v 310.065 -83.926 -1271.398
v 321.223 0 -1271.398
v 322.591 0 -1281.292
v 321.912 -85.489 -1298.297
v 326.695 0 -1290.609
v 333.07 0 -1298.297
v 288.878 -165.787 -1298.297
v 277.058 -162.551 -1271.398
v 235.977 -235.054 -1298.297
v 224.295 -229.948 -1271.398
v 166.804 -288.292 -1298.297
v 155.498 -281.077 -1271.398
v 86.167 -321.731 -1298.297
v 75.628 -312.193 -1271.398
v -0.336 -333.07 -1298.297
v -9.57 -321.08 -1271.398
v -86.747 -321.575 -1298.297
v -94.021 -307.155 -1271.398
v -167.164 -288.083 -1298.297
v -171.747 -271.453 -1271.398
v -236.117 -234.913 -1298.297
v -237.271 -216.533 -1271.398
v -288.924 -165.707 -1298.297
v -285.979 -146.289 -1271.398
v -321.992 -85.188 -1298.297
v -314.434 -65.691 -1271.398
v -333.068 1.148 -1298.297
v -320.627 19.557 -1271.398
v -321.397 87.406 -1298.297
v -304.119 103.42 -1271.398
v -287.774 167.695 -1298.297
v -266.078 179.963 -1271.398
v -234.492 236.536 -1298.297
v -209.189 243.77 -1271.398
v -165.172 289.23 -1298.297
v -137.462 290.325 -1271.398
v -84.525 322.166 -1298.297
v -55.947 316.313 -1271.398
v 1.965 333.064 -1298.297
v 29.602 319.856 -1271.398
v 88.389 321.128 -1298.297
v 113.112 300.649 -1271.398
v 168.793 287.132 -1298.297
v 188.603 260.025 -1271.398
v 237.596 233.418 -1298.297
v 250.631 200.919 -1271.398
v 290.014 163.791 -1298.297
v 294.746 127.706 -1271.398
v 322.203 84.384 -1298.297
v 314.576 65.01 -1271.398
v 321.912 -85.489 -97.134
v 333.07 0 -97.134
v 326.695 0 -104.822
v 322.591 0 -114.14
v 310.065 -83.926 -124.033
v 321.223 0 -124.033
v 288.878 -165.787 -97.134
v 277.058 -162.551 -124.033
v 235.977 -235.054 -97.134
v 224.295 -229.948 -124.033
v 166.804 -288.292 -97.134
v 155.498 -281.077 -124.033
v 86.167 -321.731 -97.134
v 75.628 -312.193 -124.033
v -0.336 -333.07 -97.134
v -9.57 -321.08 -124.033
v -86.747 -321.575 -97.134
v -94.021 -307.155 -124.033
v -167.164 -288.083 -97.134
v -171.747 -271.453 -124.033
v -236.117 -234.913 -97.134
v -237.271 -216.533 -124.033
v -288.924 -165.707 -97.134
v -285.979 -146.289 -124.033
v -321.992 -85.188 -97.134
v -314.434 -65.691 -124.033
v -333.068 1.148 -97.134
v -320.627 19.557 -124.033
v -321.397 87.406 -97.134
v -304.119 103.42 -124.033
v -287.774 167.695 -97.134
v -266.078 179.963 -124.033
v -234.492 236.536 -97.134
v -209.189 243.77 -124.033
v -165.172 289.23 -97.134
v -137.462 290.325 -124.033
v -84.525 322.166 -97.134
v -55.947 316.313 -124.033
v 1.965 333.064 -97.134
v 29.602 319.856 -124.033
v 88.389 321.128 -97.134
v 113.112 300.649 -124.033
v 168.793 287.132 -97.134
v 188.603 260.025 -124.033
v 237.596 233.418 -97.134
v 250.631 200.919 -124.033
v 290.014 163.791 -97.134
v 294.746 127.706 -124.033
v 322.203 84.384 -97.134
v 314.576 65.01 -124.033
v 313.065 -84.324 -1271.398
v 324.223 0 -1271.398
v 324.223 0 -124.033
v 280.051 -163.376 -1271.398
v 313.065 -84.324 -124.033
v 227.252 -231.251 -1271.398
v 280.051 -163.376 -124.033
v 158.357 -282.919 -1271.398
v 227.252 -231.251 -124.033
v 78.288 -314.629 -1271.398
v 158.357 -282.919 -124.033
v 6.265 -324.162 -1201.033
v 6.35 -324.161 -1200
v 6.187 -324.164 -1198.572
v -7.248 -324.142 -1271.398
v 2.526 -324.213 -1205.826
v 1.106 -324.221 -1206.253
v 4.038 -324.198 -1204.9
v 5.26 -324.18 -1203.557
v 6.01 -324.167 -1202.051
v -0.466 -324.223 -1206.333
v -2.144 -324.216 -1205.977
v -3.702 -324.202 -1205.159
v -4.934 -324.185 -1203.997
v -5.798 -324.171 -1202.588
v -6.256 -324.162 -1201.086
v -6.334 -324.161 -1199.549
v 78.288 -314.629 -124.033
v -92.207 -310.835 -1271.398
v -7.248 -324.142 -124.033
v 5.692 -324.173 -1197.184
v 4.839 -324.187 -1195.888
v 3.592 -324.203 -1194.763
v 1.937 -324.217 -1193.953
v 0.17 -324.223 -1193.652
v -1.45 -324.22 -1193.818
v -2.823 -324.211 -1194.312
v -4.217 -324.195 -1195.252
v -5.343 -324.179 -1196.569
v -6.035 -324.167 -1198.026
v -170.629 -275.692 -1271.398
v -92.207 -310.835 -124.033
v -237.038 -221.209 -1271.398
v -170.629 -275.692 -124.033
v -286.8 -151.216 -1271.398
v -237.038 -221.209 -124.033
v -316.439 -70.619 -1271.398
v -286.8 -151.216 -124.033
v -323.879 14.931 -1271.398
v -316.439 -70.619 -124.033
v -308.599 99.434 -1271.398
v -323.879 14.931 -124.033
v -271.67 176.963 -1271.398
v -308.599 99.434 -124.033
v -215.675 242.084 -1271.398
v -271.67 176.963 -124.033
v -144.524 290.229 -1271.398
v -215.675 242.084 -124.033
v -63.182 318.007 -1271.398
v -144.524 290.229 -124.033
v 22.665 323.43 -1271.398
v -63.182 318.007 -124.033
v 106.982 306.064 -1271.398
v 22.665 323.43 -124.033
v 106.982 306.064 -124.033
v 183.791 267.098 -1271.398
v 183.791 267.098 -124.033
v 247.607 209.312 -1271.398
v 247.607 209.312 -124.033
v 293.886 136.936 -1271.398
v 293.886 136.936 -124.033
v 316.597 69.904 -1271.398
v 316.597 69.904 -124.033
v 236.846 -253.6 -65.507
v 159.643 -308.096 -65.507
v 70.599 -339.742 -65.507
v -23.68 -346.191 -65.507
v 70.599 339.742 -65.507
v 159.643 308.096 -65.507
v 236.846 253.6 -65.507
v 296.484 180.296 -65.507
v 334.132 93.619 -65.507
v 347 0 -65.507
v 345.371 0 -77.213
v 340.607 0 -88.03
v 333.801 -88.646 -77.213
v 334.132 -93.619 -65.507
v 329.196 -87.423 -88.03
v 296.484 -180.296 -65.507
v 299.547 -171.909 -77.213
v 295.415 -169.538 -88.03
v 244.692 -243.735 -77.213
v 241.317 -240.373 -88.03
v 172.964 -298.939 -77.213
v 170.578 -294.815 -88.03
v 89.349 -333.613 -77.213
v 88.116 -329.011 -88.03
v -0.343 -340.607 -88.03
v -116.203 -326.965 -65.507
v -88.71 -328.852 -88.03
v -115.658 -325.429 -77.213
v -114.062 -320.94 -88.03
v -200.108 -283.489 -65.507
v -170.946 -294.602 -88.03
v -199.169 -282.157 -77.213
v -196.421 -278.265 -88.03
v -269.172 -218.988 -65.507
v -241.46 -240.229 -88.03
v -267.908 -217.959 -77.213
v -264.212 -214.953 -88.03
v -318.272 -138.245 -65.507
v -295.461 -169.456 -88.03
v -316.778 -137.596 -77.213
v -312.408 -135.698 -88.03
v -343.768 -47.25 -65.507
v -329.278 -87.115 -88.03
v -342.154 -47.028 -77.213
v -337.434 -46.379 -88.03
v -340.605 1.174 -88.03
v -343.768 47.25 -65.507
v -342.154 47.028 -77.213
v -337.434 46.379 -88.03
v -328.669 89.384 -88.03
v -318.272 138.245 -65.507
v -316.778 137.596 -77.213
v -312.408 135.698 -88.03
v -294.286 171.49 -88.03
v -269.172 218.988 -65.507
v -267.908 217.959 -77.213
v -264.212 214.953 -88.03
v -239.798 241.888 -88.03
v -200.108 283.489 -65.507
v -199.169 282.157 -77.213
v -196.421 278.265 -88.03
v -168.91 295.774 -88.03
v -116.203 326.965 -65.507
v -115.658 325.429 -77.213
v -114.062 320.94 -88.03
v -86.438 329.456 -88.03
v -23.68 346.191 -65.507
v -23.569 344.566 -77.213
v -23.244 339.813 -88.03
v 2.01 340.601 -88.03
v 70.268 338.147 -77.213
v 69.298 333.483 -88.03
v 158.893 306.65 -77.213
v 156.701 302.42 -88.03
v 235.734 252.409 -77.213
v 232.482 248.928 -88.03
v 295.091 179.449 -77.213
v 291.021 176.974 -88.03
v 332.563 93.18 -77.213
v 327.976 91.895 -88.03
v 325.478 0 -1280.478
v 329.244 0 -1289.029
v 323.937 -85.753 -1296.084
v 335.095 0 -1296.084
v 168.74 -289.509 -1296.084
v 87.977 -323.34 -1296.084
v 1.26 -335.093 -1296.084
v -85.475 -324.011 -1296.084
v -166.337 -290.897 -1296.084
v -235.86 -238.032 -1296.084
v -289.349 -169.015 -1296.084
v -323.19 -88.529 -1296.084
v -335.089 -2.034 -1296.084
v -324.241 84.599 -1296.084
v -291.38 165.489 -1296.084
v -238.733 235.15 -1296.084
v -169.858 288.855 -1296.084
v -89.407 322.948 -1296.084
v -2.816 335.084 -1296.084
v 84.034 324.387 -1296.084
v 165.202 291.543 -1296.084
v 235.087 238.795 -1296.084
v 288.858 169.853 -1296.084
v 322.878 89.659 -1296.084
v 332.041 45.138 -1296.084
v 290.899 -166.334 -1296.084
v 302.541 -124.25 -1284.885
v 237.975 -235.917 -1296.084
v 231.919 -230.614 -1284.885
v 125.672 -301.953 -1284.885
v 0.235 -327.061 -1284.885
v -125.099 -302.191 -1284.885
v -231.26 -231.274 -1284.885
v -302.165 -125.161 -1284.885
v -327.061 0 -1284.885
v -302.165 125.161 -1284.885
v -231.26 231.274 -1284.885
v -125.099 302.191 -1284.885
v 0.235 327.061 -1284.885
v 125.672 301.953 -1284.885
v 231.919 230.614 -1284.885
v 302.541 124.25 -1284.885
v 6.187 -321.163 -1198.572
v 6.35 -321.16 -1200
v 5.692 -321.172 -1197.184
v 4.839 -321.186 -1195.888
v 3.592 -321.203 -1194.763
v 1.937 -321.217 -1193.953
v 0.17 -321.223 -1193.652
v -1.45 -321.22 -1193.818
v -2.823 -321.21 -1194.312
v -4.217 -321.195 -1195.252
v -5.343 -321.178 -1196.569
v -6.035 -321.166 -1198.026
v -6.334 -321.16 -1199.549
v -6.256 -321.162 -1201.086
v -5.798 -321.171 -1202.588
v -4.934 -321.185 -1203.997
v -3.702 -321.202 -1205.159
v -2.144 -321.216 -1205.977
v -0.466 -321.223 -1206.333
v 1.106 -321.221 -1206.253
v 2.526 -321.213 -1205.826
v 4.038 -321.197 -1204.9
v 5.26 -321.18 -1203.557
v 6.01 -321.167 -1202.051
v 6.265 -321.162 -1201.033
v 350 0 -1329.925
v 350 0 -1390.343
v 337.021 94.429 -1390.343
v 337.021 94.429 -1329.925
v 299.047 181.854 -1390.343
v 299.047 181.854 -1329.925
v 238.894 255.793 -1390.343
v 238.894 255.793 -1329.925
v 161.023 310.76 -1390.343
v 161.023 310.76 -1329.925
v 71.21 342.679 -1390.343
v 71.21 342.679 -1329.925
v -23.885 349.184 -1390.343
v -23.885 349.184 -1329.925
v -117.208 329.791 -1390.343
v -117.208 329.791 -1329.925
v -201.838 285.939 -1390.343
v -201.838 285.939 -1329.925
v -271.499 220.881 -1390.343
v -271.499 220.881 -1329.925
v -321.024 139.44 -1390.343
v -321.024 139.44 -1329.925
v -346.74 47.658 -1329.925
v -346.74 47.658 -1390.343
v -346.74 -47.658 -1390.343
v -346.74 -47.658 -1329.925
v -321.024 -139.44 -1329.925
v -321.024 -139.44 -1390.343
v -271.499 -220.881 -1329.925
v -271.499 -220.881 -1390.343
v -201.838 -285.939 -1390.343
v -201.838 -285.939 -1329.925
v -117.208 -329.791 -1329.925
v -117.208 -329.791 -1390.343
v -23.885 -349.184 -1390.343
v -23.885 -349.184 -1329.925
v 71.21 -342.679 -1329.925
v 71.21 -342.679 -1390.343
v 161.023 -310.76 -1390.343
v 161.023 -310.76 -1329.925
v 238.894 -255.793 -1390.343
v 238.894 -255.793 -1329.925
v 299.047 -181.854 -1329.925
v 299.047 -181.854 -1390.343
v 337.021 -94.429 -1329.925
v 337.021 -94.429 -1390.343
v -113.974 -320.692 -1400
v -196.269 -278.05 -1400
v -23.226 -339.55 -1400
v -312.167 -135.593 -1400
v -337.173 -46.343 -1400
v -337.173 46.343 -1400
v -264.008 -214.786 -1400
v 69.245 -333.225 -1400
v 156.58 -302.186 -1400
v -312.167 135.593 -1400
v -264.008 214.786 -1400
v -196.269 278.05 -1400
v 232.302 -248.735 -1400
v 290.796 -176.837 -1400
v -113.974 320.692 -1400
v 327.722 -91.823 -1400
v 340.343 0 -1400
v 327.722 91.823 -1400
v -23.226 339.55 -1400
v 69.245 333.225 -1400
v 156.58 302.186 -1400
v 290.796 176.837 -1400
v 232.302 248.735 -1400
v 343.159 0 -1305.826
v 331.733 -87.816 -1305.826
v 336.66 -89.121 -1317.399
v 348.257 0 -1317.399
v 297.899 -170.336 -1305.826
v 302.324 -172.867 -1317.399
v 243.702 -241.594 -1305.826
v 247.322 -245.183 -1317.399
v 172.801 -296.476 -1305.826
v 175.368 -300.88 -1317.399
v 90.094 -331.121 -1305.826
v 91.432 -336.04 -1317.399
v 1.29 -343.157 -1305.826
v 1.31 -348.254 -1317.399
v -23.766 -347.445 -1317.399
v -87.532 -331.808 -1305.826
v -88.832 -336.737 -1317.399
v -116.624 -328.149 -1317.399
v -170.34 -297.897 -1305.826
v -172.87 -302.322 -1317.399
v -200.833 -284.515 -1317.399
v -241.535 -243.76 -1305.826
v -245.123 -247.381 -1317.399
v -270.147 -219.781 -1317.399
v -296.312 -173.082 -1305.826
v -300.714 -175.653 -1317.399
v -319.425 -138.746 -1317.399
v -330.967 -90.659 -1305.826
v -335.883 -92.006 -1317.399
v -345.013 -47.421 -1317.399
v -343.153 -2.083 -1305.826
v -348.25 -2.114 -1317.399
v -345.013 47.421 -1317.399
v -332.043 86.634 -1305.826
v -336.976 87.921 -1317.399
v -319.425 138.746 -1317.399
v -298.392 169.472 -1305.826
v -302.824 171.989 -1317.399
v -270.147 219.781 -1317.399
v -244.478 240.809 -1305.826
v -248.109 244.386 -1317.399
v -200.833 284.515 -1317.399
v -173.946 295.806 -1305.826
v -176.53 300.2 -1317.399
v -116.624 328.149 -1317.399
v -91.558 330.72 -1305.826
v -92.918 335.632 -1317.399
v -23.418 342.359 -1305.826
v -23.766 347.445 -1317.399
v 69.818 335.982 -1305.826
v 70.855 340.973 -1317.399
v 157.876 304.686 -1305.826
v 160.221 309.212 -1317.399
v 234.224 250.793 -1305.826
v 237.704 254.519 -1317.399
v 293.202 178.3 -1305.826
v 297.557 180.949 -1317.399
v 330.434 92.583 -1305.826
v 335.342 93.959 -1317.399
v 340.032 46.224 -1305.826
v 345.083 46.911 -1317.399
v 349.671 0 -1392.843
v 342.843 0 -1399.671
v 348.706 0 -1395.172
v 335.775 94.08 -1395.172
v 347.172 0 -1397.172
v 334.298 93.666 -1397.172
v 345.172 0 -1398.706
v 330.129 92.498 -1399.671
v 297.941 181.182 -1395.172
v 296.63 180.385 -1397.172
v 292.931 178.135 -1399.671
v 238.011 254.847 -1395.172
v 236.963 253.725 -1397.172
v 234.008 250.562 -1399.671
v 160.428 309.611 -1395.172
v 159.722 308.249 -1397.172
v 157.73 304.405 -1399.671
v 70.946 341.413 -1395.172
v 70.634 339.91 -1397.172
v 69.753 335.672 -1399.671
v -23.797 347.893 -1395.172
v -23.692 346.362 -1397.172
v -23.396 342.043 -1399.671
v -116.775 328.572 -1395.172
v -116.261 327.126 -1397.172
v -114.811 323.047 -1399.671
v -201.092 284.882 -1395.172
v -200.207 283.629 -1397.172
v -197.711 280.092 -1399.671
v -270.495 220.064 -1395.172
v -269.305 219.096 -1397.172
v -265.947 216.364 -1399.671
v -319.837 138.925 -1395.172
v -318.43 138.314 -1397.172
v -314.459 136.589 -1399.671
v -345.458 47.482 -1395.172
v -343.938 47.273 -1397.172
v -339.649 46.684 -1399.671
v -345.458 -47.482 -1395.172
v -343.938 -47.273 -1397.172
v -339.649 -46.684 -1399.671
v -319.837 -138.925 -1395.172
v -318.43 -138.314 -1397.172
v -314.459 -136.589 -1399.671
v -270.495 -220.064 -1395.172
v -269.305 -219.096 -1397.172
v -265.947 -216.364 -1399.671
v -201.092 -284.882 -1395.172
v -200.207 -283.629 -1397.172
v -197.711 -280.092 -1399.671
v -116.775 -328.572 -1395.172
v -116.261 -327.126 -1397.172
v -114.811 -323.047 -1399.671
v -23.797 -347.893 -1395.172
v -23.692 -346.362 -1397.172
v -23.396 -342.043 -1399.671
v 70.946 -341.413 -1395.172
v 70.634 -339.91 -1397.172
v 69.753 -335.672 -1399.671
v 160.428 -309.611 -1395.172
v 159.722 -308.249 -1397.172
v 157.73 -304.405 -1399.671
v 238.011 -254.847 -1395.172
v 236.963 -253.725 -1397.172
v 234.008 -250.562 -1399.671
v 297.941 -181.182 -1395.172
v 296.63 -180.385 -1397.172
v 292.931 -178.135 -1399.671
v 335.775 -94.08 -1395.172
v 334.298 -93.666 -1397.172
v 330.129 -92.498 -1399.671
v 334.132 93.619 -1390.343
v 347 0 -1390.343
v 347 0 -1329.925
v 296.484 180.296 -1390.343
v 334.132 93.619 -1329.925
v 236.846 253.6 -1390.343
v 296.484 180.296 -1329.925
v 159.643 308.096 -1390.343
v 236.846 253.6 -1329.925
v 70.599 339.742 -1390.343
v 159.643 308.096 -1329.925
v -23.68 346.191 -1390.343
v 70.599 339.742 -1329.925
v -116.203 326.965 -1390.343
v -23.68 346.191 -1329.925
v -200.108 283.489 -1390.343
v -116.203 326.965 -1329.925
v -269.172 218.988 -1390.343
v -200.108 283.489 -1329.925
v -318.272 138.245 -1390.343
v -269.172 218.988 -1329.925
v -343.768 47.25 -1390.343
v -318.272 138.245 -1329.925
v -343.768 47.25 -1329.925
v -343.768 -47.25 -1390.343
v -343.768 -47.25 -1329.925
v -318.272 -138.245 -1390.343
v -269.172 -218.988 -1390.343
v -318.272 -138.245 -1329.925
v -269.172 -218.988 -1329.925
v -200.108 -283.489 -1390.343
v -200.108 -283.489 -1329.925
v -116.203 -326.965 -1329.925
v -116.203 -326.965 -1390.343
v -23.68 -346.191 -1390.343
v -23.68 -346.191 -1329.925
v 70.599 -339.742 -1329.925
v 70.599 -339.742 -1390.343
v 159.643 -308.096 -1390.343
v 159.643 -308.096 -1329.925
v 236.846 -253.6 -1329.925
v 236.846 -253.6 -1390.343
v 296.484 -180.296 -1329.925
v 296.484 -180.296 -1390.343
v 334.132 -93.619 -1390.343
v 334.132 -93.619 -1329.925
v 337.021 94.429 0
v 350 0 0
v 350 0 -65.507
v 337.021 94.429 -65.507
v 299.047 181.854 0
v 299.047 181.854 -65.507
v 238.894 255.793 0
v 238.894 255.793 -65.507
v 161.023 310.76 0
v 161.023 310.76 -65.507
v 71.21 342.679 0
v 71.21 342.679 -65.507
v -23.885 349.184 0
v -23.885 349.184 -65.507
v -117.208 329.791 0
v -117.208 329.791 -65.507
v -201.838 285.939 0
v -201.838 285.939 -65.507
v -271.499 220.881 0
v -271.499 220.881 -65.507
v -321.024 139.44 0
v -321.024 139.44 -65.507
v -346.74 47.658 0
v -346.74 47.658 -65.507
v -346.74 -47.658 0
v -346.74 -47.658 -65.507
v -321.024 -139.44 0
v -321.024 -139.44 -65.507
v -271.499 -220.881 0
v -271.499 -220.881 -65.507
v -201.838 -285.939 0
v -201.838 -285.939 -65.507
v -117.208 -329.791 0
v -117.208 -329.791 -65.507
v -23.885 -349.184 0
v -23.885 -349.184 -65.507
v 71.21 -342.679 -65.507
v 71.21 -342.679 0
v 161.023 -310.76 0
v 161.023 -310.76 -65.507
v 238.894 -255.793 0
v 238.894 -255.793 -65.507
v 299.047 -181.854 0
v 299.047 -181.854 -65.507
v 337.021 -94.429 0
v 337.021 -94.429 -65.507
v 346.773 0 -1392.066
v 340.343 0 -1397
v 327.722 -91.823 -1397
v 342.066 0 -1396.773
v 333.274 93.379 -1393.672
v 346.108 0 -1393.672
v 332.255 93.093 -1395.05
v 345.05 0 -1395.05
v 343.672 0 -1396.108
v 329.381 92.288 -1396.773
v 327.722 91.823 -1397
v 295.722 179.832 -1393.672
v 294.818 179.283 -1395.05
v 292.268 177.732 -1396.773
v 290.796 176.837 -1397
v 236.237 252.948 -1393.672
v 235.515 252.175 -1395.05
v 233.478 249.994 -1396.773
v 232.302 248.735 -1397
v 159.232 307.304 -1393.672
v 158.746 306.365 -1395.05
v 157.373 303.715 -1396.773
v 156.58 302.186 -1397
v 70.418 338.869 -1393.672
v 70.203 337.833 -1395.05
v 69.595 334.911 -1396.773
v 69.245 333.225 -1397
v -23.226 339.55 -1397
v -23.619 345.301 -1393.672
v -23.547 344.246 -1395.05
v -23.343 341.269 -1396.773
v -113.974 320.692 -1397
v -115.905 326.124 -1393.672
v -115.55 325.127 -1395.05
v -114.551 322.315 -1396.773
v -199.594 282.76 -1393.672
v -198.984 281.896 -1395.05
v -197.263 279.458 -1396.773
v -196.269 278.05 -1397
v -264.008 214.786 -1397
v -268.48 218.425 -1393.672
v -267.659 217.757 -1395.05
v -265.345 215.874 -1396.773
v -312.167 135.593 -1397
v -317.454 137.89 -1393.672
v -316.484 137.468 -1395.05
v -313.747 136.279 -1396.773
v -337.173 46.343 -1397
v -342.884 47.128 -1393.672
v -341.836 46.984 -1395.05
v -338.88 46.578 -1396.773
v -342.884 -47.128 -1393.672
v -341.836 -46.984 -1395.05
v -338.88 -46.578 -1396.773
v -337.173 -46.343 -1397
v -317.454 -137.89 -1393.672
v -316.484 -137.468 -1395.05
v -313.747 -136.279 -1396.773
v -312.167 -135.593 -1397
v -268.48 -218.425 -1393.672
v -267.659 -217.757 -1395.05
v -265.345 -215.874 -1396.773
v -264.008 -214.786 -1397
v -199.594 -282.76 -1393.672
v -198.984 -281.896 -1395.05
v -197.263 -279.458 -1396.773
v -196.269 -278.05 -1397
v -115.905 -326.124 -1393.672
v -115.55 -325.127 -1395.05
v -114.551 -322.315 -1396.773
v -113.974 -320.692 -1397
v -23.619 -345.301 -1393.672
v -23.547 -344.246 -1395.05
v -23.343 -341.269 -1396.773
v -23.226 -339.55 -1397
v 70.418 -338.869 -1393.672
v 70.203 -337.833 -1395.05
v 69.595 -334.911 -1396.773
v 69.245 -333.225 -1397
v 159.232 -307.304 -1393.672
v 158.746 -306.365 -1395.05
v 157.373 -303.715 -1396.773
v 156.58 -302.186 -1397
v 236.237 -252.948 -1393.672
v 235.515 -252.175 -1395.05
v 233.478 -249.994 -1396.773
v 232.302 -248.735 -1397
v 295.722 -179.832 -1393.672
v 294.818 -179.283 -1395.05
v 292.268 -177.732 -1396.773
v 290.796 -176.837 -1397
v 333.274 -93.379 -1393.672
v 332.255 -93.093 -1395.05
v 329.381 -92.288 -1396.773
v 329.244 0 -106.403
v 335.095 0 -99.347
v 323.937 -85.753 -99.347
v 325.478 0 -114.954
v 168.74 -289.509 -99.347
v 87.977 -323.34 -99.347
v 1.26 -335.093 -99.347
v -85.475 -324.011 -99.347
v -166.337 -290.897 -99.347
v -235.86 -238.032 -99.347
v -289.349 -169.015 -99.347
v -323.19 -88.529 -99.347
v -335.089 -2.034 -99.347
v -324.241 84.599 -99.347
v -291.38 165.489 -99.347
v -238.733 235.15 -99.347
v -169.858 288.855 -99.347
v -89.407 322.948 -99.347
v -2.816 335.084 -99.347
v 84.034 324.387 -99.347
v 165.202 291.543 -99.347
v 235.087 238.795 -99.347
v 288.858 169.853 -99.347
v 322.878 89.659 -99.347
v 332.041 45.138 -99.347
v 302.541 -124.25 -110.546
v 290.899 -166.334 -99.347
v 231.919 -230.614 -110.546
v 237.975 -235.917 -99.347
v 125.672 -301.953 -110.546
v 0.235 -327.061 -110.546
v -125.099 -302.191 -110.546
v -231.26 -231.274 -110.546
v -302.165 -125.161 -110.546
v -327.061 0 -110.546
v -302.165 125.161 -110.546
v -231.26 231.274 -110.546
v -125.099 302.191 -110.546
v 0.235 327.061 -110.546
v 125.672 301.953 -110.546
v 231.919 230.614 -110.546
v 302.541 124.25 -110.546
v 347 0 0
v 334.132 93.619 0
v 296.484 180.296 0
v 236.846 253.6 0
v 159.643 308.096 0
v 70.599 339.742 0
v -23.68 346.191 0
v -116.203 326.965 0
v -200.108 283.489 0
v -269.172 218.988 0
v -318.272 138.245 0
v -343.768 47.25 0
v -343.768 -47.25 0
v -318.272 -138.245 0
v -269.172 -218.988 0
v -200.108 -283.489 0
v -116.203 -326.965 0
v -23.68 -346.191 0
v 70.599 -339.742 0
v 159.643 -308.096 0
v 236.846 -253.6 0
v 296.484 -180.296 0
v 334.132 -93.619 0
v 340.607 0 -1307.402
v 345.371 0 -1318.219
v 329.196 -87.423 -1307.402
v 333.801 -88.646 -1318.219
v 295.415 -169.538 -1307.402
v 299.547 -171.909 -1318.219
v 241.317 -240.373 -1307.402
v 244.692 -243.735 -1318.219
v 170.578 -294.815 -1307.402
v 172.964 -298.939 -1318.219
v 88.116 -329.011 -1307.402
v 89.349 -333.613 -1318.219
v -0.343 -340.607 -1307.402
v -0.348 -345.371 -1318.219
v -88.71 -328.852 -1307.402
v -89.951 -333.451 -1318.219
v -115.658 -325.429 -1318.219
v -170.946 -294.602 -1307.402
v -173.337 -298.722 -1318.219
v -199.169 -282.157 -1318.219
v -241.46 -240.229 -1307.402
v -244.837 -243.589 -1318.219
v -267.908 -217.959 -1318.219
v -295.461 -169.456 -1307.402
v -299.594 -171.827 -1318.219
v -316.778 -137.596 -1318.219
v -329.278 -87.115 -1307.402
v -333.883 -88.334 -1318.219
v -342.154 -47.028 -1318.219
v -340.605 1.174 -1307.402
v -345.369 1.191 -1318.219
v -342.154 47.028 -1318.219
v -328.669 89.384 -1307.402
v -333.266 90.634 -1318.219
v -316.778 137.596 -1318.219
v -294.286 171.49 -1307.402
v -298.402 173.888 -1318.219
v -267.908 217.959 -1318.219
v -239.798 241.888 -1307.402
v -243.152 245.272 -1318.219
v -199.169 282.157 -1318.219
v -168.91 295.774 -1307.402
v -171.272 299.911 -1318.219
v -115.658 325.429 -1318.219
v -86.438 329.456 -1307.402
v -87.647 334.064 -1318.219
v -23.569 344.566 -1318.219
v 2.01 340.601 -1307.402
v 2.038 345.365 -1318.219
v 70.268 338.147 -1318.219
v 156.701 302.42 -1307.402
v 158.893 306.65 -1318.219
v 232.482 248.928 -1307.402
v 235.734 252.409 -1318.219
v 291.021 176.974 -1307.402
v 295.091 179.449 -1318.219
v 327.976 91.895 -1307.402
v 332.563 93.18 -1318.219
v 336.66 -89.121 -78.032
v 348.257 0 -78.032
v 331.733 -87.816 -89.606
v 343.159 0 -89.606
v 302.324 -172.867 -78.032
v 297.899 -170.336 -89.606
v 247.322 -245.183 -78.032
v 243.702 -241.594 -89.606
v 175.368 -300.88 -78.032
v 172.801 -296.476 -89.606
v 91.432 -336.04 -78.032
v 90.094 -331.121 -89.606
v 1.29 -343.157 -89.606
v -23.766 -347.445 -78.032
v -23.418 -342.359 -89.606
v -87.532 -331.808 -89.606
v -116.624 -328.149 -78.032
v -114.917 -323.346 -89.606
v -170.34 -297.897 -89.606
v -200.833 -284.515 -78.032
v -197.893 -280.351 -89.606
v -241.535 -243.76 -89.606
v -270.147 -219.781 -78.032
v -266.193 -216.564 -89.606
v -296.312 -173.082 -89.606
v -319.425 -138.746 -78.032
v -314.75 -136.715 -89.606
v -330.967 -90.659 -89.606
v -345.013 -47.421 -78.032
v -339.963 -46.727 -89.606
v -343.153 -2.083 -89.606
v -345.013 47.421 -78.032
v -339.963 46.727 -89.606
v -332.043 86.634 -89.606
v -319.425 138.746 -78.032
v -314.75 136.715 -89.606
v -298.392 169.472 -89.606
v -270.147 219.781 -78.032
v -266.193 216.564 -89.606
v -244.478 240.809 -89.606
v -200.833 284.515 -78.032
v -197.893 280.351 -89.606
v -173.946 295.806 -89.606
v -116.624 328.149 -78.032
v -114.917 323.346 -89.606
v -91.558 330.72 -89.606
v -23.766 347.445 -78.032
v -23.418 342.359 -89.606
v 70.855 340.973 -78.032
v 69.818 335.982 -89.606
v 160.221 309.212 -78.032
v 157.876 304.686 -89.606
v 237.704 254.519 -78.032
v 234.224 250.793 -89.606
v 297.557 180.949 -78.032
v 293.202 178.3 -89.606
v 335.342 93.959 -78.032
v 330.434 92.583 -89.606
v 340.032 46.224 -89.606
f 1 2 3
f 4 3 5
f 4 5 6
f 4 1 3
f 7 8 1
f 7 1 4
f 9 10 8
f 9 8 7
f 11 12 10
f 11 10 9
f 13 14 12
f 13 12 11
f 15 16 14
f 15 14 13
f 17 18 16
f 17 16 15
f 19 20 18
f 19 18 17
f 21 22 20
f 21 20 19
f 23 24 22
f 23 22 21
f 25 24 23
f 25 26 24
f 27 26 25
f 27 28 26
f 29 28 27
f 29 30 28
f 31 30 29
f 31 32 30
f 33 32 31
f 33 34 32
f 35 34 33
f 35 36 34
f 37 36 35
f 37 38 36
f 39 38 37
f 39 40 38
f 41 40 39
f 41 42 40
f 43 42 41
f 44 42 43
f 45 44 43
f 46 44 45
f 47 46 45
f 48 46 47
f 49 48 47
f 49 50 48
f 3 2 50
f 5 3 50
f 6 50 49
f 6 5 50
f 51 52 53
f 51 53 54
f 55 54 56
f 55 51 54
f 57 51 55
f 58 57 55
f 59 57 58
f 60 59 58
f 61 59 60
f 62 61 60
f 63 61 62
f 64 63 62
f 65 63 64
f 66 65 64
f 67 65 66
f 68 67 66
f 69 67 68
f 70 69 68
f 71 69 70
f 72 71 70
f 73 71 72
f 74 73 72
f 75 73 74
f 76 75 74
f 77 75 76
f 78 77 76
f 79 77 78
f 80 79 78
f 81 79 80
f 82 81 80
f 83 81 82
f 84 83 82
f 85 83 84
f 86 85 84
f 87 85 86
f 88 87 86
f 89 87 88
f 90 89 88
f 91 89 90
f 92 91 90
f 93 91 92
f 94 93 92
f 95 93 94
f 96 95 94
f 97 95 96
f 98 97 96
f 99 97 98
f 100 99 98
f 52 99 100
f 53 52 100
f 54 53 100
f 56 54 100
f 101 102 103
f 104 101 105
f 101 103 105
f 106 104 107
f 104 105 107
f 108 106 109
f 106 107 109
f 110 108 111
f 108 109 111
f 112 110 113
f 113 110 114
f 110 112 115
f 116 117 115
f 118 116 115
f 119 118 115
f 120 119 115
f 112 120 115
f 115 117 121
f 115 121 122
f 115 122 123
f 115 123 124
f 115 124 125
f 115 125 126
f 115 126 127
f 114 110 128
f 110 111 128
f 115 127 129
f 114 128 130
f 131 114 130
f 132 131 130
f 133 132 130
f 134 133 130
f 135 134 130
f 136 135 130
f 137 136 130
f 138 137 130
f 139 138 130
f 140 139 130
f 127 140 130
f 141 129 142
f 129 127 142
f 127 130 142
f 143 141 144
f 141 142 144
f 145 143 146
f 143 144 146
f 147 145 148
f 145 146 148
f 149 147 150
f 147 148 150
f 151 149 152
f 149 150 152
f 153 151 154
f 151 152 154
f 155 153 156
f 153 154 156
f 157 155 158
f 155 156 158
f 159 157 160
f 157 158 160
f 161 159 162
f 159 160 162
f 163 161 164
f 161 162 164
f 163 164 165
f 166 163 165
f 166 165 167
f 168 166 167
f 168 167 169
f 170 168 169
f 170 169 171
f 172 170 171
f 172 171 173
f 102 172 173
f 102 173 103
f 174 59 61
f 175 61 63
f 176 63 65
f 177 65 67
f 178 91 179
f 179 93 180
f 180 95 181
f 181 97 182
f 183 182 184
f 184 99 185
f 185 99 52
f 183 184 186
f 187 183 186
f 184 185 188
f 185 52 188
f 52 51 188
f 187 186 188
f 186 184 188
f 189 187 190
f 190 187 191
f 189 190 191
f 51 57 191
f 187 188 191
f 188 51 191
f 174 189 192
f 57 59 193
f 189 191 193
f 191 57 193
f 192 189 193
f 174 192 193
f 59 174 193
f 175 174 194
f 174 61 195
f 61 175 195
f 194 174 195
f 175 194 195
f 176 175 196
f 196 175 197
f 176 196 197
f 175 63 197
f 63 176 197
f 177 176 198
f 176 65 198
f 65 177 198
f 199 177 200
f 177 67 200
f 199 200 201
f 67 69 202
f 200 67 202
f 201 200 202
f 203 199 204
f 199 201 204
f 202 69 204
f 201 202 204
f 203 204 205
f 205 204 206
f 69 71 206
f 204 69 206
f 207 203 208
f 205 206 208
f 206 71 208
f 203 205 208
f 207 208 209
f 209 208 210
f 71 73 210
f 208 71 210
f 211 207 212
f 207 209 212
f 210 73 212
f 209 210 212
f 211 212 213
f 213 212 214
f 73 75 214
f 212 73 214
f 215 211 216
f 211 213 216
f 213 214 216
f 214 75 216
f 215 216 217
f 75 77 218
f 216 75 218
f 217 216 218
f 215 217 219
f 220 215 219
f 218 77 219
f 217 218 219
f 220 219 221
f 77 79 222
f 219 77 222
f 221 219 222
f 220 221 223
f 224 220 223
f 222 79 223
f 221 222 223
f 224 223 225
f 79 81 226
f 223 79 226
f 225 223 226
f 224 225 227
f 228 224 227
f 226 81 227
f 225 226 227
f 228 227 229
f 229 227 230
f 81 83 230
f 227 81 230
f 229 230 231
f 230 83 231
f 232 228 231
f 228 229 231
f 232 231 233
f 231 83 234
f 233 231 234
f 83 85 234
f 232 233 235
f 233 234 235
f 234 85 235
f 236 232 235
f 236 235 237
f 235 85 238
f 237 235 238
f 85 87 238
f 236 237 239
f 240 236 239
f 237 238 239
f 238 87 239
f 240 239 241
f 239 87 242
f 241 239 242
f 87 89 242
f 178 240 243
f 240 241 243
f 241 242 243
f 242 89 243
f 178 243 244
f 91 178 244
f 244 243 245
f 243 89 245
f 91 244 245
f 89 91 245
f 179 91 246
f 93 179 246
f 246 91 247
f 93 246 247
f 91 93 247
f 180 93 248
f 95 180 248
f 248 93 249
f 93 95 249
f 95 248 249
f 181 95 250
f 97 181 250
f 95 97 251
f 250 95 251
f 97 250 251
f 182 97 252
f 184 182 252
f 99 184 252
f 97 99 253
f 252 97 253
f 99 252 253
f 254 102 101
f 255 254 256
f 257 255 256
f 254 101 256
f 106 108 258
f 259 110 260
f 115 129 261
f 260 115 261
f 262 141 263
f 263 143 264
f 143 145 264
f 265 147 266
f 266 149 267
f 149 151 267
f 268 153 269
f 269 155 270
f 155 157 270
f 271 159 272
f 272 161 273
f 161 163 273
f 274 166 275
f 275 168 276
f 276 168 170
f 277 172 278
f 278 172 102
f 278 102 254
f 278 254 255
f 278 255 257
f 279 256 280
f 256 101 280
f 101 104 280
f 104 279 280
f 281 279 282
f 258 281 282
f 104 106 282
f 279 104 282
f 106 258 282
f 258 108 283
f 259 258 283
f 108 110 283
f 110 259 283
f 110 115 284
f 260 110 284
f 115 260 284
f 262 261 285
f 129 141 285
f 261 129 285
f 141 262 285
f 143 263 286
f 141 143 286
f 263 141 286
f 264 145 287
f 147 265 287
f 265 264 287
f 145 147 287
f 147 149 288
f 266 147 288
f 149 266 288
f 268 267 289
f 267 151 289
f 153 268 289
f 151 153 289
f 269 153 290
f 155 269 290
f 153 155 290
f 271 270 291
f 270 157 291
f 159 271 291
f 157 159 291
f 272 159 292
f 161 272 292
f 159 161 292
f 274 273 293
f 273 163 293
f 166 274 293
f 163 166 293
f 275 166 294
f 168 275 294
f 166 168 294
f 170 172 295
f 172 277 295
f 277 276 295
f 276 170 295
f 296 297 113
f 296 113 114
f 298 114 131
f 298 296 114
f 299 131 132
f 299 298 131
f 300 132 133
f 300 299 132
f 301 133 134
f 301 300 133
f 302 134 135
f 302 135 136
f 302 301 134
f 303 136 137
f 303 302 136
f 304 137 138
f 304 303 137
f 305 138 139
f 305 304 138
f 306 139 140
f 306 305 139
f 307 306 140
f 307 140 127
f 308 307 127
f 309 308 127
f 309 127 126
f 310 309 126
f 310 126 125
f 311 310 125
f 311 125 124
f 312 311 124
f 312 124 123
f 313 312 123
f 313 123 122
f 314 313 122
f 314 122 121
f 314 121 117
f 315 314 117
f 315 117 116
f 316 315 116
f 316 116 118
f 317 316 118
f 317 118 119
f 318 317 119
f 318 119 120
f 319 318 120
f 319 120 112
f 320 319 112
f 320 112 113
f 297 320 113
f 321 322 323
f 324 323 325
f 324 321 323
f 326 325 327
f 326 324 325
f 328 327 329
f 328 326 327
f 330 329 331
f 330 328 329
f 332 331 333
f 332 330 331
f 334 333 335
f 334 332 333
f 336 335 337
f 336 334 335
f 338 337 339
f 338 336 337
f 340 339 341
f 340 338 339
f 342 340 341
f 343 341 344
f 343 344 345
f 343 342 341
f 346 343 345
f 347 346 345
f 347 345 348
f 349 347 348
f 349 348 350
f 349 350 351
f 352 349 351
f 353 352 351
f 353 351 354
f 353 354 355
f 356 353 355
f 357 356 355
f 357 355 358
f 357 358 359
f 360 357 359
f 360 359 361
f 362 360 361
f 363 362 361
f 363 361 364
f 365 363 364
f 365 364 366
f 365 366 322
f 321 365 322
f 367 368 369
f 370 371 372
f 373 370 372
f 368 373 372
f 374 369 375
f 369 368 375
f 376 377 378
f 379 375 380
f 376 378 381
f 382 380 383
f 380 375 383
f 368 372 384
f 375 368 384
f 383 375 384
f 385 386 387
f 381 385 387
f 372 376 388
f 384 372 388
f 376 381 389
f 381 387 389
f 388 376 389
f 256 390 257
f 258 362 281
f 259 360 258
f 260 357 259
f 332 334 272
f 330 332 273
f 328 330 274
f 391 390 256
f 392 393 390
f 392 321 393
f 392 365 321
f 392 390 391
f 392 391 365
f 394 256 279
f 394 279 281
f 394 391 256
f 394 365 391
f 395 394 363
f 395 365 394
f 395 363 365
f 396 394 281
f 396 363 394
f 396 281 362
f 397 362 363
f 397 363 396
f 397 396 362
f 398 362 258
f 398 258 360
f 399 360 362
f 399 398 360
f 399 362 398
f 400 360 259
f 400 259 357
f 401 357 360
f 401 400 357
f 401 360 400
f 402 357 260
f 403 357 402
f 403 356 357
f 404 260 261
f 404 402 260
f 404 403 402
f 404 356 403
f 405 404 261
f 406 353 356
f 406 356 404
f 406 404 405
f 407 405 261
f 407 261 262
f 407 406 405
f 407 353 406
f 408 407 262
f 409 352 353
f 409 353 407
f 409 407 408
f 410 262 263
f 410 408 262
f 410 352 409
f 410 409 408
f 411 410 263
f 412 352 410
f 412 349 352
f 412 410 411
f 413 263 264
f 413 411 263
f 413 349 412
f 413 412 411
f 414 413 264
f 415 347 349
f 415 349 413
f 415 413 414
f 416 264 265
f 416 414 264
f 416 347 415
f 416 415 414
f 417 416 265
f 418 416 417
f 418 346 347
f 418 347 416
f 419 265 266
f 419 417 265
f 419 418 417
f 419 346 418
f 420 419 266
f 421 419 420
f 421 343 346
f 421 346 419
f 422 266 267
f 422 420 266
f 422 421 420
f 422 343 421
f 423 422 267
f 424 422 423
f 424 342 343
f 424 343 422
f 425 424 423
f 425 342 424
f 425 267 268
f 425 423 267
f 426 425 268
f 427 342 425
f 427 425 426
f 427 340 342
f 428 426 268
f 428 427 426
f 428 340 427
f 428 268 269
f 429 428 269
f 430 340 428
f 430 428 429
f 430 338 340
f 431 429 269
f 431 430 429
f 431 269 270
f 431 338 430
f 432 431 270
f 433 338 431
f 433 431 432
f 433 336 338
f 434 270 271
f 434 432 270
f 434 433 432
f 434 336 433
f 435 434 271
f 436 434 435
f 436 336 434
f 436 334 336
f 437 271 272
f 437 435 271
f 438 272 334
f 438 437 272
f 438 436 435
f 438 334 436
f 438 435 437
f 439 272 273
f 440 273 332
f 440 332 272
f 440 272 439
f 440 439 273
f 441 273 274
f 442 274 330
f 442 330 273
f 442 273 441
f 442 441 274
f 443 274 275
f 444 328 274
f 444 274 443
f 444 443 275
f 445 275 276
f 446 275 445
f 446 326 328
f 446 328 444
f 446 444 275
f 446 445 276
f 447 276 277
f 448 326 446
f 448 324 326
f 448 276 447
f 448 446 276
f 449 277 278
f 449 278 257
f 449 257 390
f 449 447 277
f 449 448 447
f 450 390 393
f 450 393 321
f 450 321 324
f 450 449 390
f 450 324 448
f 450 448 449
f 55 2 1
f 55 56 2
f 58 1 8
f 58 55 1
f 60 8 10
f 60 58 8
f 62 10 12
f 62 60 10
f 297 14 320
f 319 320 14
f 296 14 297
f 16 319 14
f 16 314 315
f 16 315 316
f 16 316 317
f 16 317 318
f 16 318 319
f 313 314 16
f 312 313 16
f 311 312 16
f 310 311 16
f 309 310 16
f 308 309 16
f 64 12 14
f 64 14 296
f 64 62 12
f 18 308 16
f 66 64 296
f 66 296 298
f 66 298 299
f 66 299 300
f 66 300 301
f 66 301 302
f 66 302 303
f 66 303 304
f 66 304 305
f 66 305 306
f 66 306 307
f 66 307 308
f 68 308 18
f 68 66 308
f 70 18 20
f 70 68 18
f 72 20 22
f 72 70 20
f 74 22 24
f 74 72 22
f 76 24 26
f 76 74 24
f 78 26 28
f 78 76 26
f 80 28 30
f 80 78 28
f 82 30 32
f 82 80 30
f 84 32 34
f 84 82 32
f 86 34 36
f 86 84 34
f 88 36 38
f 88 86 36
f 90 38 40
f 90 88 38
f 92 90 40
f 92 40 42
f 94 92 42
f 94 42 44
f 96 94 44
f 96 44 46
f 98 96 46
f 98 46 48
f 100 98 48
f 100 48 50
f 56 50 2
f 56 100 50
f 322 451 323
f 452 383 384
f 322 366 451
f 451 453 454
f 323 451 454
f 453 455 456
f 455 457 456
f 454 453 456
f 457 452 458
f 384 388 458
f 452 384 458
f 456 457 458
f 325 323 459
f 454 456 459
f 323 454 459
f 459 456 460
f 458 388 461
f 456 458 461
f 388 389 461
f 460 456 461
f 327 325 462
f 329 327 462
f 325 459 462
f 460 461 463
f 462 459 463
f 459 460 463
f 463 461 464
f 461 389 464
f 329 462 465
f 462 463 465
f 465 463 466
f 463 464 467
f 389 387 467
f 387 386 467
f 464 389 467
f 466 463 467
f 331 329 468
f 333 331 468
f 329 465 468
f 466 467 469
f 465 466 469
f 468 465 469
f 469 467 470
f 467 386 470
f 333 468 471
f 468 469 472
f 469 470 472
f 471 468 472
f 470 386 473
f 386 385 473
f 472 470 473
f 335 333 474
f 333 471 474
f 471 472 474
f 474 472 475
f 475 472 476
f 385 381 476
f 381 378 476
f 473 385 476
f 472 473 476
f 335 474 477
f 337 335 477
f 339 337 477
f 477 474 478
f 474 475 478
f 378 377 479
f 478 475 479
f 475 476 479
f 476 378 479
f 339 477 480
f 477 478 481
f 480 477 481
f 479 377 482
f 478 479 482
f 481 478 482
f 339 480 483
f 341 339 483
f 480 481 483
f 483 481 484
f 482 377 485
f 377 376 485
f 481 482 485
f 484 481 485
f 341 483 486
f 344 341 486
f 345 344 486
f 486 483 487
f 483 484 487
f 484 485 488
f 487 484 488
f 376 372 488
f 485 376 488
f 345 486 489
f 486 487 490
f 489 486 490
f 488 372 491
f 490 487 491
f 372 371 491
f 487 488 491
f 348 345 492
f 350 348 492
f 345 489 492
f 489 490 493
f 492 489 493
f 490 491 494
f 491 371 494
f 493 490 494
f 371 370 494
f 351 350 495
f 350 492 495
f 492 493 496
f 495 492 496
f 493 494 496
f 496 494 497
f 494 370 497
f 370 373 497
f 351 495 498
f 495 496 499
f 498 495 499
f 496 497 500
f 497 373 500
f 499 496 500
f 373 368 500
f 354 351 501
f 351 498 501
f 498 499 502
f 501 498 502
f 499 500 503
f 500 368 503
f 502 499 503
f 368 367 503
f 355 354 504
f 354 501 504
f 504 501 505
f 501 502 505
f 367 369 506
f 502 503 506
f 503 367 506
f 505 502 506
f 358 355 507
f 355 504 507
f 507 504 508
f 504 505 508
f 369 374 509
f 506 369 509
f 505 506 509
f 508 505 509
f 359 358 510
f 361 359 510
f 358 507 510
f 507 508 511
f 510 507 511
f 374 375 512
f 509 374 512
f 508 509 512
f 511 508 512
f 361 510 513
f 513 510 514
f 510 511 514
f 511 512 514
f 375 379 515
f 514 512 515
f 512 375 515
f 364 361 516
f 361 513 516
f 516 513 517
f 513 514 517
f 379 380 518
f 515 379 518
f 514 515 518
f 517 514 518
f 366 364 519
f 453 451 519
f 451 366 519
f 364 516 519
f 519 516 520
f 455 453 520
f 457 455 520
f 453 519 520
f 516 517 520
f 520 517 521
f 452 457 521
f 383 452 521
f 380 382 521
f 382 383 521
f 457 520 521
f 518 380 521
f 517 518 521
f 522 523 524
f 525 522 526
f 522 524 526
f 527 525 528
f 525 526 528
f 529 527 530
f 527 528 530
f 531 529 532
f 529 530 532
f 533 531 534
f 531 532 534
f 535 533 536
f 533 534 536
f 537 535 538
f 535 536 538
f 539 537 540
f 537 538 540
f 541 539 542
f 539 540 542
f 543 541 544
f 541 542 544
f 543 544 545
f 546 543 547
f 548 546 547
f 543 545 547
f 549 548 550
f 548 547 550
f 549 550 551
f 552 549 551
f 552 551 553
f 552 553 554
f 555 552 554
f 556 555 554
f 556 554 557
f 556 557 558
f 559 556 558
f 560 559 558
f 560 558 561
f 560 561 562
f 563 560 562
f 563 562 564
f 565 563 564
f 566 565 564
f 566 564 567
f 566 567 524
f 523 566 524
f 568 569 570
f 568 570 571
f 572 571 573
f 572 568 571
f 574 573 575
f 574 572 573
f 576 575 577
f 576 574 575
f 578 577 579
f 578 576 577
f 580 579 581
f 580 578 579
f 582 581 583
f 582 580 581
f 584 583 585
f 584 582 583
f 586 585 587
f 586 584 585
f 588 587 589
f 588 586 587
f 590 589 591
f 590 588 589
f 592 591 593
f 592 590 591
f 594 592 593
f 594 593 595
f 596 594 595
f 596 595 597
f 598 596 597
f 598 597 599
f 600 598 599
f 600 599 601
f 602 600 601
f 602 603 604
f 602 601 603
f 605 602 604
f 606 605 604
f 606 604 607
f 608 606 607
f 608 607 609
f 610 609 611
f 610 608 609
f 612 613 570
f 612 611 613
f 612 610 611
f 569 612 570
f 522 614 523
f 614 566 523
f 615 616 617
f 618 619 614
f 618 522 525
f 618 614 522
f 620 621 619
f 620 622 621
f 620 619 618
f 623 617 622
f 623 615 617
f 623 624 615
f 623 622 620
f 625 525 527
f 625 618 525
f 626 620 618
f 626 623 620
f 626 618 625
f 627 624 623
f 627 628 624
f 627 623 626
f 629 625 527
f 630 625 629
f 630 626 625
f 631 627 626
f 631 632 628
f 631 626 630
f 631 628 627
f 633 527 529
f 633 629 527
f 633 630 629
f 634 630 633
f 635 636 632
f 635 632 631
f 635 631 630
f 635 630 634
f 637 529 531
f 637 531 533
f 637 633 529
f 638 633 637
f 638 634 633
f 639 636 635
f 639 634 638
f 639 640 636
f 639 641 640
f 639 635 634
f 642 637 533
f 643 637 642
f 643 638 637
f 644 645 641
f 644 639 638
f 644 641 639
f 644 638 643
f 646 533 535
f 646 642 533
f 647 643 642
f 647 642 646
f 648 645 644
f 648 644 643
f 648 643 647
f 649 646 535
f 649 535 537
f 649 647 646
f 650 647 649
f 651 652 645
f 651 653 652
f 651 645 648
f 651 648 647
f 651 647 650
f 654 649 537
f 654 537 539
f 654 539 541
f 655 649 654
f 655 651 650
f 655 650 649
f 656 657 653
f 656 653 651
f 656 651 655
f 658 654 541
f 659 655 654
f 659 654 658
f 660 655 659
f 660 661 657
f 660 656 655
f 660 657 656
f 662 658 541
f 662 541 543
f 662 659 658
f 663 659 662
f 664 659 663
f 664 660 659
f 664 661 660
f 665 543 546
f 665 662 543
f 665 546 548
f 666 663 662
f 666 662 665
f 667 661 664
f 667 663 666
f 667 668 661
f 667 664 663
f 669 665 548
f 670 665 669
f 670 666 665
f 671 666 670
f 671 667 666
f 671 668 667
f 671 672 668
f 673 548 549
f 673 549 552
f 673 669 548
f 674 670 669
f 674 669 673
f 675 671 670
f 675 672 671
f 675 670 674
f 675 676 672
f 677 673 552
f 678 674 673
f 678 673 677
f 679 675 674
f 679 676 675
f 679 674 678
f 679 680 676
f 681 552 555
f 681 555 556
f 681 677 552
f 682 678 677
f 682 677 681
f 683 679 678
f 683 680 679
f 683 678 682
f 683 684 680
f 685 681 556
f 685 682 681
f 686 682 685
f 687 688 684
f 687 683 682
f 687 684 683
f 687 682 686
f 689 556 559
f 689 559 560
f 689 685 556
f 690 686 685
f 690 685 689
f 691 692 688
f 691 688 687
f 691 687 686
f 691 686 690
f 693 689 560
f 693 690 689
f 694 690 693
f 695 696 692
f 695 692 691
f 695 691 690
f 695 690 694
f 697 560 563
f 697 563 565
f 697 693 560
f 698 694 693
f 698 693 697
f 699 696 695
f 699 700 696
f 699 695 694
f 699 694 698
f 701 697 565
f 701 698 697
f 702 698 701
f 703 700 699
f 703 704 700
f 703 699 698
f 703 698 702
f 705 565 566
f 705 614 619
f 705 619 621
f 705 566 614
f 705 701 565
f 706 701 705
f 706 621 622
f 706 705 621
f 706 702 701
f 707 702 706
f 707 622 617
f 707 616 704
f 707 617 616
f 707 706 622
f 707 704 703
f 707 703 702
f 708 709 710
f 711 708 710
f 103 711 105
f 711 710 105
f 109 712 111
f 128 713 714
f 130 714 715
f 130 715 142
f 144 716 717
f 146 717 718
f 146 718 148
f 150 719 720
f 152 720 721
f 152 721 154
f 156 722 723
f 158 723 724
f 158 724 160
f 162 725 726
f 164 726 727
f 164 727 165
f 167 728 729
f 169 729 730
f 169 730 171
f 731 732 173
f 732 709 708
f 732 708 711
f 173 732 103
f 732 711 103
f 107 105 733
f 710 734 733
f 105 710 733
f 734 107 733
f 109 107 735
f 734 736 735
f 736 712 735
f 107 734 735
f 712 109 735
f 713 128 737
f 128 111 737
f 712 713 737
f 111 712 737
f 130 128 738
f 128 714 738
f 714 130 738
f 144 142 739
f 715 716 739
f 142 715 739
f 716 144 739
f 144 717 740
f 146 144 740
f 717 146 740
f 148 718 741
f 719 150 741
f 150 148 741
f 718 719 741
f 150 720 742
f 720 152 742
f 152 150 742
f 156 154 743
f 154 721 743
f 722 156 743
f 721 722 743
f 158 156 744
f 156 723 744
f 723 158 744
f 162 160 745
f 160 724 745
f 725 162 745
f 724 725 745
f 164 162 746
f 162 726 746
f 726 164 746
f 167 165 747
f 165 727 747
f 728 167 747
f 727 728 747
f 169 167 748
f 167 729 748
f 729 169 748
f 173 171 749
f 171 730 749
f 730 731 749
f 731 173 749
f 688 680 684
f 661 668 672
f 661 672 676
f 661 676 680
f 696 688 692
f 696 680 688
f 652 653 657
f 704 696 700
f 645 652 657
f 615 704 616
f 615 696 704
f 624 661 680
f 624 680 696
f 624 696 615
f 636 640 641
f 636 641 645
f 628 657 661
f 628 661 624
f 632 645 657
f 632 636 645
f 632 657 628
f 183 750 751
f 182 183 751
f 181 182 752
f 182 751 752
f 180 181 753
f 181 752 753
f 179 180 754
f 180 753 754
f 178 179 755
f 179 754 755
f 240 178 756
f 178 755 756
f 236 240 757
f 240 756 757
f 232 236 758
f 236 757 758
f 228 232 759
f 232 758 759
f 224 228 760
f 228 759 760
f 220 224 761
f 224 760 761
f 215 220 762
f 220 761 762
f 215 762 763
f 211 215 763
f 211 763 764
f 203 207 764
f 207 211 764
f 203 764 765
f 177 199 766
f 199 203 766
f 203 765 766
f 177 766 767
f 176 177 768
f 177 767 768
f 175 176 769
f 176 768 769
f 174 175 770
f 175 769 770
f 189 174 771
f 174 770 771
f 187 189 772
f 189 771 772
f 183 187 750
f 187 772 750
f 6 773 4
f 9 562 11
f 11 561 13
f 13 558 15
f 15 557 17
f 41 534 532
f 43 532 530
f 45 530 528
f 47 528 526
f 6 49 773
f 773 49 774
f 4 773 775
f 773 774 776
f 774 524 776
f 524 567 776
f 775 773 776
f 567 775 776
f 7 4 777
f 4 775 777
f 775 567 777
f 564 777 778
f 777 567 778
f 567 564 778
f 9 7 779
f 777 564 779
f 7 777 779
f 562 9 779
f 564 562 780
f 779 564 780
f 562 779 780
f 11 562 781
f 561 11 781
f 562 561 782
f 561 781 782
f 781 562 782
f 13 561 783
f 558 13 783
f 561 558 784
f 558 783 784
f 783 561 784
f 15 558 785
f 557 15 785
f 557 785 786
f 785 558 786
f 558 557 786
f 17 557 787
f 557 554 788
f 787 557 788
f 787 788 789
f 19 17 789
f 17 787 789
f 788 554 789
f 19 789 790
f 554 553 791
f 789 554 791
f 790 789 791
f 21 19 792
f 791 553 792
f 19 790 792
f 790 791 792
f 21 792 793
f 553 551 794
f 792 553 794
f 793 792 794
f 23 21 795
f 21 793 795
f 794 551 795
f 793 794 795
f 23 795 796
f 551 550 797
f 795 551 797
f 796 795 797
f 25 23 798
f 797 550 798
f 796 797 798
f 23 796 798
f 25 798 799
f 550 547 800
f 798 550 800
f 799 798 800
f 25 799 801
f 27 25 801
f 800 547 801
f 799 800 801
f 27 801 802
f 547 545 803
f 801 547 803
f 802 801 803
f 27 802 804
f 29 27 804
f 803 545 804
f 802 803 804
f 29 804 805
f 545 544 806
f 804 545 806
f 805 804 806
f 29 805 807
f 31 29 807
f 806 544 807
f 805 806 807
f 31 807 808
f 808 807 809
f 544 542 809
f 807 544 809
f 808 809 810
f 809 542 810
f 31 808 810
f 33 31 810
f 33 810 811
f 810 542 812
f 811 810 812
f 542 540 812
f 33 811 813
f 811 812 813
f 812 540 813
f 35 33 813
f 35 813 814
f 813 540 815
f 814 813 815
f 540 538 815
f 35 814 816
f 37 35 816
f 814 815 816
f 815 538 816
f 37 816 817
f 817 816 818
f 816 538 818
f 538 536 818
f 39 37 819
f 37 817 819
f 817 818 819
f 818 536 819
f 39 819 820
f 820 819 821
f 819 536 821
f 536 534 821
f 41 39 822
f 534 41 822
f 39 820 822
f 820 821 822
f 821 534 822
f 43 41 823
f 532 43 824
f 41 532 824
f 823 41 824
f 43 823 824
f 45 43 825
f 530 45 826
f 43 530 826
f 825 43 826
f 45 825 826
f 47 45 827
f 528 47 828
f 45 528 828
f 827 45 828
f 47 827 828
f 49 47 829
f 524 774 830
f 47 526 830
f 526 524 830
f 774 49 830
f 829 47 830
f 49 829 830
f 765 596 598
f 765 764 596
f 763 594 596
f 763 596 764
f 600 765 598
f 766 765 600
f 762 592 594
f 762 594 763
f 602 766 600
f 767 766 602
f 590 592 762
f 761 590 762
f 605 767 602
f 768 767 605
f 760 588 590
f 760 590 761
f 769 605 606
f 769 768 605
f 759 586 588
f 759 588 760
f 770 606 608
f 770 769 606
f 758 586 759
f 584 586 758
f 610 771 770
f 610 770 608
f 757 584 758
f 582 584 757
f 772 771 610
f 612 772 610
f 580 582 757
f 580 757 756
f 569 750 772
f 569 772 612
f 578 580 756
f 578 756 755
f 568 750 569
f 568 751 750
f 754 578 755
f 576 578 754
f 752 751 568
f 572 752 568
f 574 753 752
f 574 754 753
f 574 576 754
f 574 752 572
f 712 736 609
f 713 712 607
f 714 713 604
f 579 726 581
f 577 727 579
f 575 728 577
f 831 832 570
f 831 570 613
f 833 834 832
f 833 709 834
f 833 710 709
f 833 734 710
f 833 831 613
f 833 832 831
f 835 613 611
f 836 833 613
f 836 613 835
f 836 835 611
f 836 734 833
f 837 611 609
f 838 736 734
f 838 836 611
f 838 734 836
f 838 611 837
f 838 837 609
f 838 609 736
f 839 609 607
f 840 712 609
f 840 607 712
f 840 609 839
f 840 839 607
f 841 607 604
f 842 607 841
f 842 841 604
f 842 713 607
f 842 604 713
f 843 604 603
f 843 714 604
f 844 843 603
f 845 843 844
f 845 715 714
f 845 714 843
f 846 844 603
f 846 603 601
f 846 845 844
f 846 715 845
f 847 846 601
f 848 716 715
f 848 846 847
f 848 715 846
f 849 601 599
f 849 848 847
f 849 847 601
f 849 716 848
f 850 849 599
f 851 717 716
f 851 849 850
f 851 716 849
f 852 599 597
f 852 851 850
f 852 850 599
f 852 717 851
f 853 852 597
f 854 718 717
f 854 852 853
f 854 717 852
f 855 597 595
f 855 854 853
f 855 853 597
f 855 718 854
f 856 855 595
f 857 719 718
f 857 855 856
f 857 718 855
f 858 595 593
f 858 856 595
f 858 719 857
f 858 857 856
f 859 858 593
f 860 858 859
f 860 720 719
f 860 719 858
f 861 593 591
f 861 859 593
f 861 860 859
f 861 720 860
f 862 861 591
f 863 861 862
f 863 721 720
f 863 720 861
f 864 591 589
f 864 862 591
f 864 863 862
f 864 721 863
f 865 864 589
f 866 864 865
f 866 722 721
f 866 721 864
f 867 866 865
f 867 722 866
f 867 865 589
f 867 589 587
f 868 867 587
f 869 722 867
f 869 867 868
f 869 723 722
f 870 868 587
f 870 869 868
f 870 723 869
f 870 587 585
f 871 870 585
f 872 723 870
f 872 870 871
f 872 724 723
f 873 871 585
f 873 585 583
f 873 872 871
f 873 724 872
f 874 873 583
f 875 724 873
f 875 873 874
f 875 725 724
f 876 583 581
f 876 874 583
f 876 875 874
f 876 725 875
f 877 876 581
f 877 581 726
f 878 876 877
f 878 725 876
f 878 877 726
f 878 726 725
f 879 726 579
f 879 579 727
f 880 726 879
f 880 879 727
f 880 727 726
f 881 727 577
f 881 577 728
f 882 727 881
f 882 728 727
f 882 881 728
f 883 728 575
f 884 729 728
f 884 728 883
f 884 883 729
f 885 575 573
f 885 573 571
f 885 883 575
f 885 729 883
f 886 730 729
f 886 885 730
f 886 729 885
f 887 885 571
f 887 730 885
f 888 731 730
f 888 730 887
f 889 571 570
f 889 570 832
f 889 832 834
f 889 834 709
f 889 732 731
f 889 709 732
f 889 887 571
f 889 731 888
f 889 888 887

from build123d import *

# Parameters (mm, degrees)
F0_R     = 350
F1_DEPTH = 1400
F3_W     = 25.7771372795
F3_H     = 1181.948132813
F6_R     = 33.4608263206
F7_R     = 9.6568542495
F8_T     = -3
F2_R     = 6.35
F9_REACH = 367.9615123421


# Not quite as in the source:
# - a fillet or chamfer that OpenCascade refuses, or shapes differently, is made with other operations: its cross-section is extruded or revolved along the edge and cut away or added


with BuildPart() as f1:
    # F0 (on Top) → F1 (new body)
    with BuildSketch(Plane.XY):
        Circle(F0_R)
    extrude(amount=-F1_DEPTH)

    # F3 (on Front) → F4 (revolve, cut)
    with BuildSketch(Plane.XZ):
        with Locations((337.1114313602, -697.7157853544)):
            Rectangle(F3_W, F3_H)
    revolve(axis=Axis((0, 0, -700), (0, 0, -1)), mode=Mode.SUBTRACT)

    # F5: fillet of radius 45.8700576851 on 2 edges, made by hand

    # F5_s1 → F5_t2 (revolve, cut)
    with BuildSketch(Plane.XZ):
        with BuildLine():
            ThreePointArc((350, -65.5065793021), (343.0254793989, -89.8211713608), (324.2228627205, -106.7417189479))
            Line((324.2228627205, -106.7417189479), (350, -106.7417189479))
            Line((350, -106.7417189479), (350, -65.5065793021))
        make_face()
    revolve(axis=Axis((0, 0, -106.7417189479), (0, 0, -1)), mode=Mode.SUBTRACT)

    # F5_s3 → F5_t4 (revolve, cut)
    with BuildSketch(Plane.XZ):
        with BuildLine():
            ThreePointArc((324.2228627205, -1288.6898517609), (343.0254793989, -1305.6103993479), (350, -1329.9249914067))
            Line((350, -1329.9249914067), (350, -1288.6898517609))
            Line((350, -1288.6898517609), (324.2228627205, -1288.6898517609))
        make_face()
    revolve(axis=Axis((0, 0, -1288.6898517609), (0, 0, -1)), mode=Mode.SUBTRACT)

    # F6
    f6_edges = [f1.edges().sort_by_distance(p)[0] for p in [
        (-324.222863, 0, -106.741719),
        (324.222863, 0, -697.715785),
        (-324.222863, 0, -1288.689852),
    ]]
    fillet(f6_edges, radius=F6_R)

    # F7
    f7_edges = [f1.edges().sort_by_distance(p)[0] for p in [
        (-350, 0, -1400),
    ]]
    fillet(f7_edges, radius=F7_R)

    # F8
    f8_openings = [f1.faces().sort_by_distance(p)[0] for p in [
        (0, 0, 0),
    ]]
    offset(amount=F8_T, openings=f8_openings)

    f9_end = f1.faces().sort_by_distance((-324.2228627205, 0, -697.7157853554))[0]
    # F2 (on Front) → F9 (cut, up to a face of the model that its end follows)
    with BuildSketch(Plane.XZ):
        with Locations((0, -1200)):
            Circle(F2_R)
    f9_long = extrude(amount=F9_REACH, mode=Mode.PRIVATE)
    add(split(f9_long, bisect_by=f9_end, keep=Keep.BOTTOM, mode=Mode.PRIVATE), mode=Mode.SUBTRACT)


solid = f1.part
